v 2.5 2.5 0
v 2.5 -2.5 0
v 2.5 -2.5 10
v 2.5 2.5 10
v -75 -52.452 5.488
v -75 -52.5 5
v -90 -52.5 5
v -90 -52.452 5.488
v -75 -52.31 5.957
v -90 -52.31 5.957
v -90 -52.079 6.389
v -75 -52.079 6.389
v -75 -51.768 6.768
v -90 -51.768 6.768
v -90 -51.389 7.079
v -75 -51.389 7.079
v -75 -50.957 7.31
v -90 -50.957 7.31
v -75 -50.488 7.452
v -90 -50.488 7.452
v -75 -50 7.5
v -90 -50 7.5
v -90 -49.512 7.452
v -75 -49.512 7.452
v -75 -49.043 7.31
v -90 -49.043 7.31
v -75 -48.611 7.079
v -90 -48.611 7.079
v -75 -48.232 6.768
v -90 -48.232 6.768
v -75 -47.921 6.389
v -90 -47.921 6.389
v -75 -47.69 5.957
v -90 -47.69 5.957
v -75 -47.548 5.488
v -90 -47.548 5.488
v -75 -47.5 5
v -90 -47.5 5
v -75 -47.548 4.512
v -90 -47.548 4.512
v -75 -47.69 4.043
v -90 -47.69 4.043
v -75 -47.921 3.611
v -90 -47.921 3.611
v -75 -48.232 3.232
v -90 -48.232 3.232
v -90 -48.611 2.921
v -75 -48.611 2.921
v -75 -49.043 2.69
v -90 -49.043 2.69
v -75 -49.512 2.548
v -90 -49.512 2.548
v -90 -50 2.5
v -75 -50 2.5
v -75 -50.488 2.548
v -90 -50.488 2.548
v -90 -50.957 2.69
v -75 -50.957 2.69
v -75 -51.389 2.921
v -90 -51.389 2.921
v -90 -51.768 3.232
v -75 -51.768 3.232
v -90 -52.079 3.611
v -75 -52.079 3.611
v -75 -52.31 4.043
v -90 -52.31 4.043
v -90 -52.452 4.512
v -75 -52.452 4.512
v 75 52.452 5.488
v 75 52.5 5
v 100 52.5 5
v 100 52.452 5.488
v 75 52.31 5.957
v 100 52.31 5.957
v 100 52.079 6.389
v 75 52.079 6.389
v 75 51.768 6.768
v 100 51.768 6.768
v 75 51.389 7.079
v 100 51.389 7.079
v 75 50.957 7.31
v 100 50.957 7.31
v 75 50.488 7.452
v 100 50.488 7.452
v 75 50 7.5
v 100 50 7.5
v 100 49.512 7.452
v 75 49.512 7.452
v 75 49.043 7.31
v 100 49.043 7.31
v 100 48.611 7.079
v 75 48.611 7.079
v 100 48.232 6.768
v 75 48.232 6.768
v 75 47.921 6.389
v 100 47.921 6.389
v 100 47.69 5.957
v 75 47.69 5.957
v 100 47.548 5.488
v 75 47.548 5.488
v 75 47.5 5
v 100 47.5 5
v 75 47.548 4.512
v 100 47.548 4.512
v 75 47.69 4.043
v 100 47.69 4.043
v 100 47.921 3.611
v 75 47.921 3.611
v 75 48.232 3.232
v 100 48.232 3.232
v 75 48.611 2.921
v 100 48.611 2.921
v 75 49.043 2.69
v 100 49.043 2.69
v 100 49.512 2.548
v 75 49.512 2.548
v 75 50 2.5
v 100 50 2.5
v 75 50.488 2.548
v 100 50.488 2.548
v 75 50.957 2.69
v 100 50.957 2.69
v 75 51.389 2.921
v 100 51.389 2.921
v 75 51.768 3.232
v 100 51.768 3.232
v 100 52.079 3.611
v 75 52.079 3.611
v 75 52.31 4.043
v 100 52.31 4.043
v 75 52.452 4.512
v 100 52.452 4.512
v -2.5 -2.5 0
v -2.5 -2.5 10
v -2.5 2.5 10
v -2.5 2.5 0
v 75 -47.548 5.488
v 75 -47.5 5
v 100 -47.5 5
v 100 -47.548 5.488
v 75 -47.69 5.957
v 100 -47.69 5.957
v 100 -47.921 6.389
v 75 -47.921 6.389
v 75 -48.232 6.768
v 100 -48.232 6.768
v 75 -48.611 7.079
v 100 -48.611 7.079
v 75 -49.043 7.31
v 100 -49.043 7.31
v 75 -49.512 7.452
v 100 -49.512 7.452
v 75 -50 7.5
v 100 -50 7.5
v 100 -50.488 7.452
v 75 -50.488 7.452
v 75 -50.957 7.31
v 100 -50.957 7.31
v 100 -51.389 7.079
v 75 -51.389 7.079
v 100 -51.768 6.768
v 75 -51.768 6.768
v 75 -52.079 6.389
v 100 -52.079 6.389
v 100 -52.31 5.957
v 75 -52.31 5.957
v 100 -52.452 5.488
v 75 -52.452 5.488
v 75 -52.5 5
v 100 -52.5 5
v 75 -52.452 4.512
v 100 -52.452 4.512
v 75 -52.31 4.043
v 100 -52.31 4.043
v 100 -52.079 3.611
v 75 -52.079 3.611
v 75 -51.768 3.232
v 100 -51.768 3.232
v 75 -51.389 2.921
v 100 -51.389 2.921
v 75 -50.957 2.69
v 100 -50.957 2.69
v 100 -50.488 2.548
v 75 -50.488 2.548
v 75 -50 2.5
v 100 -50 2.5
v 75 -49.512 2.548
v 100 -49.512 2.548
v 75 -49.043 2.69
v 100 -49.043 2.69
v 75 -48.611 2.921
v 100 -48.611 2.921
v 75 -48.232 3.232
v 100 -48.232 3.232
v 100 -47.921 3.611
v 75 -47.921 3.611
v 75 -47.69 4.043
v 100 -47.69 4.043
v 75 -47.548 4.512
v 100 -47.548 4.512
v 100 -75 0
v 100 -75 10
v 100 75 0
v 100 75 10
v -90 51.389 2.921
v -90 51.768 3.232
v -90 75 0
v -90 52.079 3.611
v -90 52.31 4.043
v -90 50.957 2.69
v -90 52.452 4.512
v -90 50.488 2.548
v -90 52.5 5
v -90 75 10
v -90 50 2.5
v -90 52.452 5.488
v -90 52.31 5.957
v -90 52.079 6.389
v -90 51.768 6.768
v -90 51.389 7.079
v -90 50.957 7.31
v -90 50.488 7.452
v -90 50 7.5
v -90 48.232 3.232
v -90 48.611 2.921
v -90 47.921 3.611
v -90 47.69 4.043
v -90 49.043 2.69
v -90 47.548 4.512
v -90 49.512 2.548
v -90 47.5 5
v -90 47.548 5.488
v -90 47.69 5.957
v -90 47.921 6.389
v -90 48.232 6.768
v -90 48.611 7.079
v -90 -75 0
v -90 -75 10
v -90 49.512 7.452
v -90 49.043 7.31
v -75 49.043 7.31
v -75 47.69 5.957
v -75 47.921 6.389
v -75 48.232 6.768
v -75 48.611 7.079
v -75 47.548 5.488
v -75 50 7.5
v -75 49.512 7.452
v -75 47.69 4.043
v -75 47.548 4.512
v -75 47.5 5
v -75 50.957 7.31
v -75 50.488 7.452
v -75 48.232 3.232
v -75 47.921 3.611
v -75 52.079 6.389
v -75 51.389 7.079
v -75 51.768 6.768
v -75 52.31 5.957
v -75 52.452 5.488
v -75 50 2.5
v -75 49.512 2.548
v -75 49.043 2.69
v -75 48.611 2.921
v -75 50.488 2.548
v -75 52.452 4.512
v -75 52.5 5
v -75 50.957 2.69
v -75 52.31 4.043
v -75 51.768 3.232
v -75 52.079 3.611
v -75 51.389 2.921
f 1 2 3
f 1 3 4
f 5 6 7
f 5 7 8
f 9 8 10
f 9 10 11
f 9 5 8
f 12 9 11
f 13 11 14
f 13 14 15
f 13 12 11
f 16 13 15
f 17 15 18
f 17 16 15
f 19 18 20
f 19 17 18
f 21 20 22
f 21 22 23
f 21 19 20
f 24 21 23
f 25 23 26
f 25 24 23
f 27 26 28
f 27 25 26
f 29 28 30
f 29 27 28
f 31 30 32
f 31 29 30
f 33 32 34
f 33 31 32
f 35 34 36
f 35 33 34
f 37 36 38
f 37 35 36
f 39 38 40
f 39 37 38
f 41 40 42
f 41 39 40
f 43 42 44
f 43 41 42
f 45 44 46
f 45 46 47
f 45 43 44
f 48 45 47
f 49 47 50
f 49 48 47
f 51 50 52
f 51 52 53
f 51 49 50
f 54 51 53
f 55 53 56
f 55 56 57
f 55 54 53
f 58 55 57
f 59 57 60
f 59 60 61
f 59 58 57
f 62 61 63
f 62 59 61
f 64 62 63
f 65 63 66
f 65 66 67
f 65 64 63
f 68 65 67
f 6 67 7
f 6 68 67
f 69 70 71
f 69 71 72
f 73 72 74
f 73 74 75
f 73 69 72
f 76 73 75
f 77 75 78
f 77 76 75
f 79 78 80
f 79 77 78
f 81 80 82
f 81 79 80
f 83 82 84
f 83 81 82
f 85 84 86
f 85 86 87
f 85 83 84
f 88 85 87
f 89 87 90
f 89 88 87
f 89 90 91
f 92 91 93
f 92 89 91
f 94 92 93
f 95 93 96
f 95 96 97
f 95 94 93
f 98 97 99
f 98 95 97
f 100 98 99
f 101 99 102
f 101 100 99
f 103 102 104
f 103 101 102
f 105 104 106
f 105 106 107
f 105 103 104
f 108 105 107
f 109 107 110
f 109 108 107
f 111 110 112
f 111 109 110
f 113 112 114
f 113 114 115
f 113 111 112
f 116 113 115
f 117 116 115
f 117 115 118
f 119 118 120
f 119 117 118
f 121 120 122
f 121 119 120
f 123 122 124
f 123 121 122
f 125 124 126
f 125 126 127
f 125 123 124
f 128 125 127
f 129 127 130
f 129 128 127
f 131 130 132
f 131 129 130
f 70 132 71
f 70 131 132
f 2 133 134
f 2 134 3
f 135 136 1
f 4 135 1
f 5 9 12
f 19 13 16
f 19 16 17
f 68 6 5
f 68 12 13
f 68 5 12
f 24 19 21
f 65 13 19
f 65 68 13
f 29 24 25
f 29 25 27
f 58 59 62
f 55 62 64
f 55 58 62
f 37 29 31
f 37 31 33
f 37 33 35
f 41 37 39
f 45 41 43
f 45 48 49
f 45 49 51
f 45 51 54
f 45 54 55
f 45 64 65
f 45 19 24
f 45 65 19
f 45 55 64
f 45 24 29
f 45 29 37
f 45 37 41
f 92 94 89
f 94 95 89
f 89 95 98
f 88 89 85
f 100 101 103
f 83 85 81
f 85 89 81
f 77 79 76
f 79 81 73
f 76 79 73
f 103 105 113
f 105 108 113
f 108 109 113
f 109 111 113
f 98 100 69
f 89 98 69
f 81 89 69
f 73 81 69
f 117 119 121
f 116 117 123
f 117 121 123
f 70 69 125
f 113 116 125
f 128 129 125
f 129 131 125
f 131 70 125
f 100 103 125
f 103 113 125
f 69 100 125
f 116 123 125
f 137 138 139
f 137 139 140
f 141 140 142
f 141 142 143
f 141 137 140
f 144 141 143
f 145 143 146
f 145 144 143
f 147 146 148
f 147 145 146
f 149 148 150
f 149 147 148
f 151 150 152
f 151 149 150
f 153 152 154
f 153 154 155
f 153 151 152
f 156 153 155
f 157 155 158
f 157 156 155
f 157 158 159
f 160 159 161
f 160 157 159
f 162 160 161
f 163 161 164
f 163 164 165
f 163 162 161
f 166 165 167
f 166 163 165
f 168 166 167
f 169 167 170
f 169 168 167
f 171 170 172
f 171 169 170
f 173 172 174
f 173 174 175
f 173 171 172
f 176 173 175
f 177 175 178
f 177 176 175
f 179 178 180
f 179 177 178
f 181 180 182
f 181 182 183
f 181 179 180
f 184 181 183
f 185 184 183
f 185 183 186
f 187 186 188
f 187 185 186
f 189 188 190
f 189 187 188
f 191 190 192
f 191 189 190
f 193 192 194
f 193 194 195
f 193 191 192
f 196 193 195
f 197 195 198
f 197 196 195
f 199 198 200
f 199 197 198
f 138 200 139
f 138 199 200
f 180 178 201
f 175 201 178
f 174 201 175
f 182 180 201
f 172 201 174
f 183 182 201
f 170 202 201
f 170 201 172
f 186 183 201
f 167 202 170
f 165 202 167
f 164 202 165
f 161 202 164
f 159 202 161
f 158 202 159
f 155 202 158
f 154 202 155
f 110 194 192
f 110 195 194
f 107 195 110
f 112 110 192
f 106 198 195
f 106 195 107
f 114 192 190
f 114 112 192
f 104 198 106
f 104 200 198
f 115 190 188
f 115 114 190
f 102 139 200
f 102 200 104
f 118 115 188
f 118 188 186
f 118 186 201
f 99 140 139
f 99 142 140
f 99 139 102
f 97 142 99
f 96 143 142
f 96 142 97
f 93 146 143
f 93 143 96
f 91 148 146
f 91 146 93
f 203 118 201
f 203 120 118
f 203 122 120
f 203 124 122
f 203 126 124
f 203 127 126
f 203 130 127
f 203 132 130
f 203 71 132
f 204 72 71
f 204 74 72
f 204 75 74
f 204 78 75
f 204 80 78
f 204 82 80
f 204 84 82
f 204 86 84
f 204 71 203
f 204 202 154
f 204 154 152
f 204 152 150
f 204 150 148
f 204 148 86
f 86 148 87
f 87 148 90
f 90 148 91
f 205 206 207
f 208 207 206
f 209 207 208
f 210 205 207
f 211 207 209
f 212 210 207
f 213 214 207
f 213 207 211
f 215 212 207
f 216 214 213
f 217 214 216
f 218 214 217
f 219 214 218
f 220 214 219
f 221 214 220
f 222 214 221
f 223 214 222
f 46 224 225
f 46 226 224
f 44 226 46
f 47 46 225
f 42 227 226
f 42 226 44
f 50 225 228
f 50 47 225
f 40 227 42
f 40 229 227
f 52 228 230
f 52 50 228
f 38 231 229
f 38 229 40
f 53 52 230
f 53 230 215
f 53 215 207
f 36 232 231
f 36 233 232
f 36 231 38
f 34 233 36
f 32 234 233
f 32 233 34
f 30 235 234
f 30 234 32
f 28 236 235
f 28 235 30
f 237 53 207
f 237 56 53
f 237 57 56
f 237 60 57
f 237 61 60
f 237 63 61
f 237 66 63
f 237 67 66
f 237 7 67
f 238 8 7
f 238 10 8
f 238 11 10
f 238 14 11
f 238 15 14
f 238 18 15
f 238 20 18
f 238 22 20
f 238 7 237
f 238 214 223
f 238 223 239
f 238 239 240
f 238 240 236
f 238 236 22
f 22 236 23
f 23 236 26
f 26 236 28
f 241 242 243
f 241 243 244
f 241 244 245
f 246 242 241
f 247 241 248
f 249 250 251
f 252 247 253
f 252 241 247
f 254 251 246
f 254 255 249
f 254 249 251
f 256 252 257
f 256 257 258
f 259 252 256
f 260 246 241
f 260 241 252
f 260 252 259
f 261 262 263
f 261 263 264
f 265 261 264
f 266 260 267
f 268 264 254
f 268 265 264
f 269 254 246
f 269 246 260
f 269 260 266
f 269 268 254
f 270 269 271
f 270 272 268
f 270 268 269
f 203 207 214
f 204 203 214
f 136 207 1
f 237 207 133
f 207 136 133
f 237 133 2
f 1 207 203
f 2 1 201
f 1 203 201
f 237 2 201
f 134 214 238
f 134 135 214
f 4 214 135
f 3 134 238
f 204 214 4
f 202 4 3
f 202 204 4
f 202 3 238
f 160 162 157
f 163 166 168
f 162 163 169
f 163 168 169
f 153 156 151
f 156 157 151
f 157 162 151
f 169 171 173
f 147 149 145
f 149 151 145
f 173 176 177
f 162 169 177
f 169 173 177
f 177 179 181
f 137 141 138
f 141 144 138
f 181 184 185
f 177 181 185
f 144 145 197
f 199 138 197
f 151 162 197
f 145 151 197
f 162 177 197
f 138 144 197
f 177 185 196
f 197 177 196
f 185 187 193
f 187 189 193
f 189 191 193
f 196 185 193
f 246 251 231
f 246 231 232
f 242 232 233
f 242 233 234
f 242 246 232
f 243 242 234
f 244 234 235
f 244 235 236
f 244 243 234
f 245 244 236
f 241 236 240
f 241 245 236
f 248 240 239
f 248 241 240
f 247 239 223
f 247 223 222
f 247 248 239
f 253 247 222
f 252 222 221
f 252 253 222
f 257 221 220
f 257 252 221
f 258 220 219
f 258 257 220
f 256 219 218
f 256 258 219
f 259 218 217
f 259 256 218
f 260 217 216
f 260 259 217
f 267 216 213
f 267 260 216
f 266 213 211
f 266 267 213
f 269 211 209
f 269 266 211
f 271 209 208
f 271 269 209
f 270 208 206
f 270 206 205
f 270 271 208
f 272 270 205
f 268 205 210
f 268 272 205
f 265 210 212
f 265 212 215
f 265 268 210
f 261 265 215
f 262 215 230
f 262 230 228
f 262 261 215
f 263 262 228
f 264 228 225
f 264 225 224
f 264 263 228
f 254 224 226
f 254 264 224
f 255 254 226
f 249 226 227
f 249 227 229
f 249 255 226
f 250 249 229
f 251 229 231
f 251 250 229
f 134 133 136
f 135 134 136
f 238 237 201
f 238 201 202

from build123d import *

# Parameters (mm, degrees)
F0_W     = 150
F0_H     = 150
F0_W_2   = 5
F0_H_2   = 5
F1_DEPTH = 10
F3_R     = 2.5
F4_DEPTH = 25
F5_W     = 150
F5_H     = 10
F5_R     = 2.5
F6_DEPTH = 15


# Not quite as in the source:
# - a feature of the source that left no trace in its solid (it failed there, or was rolled back) is left out


with BuildPart() as f1:
    # F0 (on Top) → F1 (new body)
    with BuildSketch(Plane.XY):
        Rectangle(F0_W, F0_H)
        Rectangle(F0_W_2, F0_H_2, mode=Mode.SUBTRACT)
    extrude(amount=F1_DEPTH)

    # F3 (on face) → F4 (join)
    with BuildSketch(Plane.YZ.offset(75)):
        Polygon((75, 0), (75, 10), (-75, 10), (-75, 0), (0, 0), align=None)
        with Locations((-50, 5)):
            Circle(F3_R, mode=Mode.SUBTRACT)
        with Locations((50, 5)):
            Circle(F3_R, mode=Mode.SUBTRACT)
    extrude(amount=F4_DEPTH)

    # F5 (on face) → F6 (join)
    with BuildSketch(Plane(origin=(-75, 0, 0), x_dir=(0, -1, 0), z_dir=(-1, 0, 0))):
        with Locations((0, 5)):
            Rectangle(F5_W, F5_H)
        with Locations((-50, 5)):
            Circle(F5_R, mode=Mode.SUBTRACT)
        with Locations((50, 5)):
            Circle(F5_R, mode=Mode.SUBTRACT)
    extrude(amount=F6_DEPTH)


solid = f1.part
